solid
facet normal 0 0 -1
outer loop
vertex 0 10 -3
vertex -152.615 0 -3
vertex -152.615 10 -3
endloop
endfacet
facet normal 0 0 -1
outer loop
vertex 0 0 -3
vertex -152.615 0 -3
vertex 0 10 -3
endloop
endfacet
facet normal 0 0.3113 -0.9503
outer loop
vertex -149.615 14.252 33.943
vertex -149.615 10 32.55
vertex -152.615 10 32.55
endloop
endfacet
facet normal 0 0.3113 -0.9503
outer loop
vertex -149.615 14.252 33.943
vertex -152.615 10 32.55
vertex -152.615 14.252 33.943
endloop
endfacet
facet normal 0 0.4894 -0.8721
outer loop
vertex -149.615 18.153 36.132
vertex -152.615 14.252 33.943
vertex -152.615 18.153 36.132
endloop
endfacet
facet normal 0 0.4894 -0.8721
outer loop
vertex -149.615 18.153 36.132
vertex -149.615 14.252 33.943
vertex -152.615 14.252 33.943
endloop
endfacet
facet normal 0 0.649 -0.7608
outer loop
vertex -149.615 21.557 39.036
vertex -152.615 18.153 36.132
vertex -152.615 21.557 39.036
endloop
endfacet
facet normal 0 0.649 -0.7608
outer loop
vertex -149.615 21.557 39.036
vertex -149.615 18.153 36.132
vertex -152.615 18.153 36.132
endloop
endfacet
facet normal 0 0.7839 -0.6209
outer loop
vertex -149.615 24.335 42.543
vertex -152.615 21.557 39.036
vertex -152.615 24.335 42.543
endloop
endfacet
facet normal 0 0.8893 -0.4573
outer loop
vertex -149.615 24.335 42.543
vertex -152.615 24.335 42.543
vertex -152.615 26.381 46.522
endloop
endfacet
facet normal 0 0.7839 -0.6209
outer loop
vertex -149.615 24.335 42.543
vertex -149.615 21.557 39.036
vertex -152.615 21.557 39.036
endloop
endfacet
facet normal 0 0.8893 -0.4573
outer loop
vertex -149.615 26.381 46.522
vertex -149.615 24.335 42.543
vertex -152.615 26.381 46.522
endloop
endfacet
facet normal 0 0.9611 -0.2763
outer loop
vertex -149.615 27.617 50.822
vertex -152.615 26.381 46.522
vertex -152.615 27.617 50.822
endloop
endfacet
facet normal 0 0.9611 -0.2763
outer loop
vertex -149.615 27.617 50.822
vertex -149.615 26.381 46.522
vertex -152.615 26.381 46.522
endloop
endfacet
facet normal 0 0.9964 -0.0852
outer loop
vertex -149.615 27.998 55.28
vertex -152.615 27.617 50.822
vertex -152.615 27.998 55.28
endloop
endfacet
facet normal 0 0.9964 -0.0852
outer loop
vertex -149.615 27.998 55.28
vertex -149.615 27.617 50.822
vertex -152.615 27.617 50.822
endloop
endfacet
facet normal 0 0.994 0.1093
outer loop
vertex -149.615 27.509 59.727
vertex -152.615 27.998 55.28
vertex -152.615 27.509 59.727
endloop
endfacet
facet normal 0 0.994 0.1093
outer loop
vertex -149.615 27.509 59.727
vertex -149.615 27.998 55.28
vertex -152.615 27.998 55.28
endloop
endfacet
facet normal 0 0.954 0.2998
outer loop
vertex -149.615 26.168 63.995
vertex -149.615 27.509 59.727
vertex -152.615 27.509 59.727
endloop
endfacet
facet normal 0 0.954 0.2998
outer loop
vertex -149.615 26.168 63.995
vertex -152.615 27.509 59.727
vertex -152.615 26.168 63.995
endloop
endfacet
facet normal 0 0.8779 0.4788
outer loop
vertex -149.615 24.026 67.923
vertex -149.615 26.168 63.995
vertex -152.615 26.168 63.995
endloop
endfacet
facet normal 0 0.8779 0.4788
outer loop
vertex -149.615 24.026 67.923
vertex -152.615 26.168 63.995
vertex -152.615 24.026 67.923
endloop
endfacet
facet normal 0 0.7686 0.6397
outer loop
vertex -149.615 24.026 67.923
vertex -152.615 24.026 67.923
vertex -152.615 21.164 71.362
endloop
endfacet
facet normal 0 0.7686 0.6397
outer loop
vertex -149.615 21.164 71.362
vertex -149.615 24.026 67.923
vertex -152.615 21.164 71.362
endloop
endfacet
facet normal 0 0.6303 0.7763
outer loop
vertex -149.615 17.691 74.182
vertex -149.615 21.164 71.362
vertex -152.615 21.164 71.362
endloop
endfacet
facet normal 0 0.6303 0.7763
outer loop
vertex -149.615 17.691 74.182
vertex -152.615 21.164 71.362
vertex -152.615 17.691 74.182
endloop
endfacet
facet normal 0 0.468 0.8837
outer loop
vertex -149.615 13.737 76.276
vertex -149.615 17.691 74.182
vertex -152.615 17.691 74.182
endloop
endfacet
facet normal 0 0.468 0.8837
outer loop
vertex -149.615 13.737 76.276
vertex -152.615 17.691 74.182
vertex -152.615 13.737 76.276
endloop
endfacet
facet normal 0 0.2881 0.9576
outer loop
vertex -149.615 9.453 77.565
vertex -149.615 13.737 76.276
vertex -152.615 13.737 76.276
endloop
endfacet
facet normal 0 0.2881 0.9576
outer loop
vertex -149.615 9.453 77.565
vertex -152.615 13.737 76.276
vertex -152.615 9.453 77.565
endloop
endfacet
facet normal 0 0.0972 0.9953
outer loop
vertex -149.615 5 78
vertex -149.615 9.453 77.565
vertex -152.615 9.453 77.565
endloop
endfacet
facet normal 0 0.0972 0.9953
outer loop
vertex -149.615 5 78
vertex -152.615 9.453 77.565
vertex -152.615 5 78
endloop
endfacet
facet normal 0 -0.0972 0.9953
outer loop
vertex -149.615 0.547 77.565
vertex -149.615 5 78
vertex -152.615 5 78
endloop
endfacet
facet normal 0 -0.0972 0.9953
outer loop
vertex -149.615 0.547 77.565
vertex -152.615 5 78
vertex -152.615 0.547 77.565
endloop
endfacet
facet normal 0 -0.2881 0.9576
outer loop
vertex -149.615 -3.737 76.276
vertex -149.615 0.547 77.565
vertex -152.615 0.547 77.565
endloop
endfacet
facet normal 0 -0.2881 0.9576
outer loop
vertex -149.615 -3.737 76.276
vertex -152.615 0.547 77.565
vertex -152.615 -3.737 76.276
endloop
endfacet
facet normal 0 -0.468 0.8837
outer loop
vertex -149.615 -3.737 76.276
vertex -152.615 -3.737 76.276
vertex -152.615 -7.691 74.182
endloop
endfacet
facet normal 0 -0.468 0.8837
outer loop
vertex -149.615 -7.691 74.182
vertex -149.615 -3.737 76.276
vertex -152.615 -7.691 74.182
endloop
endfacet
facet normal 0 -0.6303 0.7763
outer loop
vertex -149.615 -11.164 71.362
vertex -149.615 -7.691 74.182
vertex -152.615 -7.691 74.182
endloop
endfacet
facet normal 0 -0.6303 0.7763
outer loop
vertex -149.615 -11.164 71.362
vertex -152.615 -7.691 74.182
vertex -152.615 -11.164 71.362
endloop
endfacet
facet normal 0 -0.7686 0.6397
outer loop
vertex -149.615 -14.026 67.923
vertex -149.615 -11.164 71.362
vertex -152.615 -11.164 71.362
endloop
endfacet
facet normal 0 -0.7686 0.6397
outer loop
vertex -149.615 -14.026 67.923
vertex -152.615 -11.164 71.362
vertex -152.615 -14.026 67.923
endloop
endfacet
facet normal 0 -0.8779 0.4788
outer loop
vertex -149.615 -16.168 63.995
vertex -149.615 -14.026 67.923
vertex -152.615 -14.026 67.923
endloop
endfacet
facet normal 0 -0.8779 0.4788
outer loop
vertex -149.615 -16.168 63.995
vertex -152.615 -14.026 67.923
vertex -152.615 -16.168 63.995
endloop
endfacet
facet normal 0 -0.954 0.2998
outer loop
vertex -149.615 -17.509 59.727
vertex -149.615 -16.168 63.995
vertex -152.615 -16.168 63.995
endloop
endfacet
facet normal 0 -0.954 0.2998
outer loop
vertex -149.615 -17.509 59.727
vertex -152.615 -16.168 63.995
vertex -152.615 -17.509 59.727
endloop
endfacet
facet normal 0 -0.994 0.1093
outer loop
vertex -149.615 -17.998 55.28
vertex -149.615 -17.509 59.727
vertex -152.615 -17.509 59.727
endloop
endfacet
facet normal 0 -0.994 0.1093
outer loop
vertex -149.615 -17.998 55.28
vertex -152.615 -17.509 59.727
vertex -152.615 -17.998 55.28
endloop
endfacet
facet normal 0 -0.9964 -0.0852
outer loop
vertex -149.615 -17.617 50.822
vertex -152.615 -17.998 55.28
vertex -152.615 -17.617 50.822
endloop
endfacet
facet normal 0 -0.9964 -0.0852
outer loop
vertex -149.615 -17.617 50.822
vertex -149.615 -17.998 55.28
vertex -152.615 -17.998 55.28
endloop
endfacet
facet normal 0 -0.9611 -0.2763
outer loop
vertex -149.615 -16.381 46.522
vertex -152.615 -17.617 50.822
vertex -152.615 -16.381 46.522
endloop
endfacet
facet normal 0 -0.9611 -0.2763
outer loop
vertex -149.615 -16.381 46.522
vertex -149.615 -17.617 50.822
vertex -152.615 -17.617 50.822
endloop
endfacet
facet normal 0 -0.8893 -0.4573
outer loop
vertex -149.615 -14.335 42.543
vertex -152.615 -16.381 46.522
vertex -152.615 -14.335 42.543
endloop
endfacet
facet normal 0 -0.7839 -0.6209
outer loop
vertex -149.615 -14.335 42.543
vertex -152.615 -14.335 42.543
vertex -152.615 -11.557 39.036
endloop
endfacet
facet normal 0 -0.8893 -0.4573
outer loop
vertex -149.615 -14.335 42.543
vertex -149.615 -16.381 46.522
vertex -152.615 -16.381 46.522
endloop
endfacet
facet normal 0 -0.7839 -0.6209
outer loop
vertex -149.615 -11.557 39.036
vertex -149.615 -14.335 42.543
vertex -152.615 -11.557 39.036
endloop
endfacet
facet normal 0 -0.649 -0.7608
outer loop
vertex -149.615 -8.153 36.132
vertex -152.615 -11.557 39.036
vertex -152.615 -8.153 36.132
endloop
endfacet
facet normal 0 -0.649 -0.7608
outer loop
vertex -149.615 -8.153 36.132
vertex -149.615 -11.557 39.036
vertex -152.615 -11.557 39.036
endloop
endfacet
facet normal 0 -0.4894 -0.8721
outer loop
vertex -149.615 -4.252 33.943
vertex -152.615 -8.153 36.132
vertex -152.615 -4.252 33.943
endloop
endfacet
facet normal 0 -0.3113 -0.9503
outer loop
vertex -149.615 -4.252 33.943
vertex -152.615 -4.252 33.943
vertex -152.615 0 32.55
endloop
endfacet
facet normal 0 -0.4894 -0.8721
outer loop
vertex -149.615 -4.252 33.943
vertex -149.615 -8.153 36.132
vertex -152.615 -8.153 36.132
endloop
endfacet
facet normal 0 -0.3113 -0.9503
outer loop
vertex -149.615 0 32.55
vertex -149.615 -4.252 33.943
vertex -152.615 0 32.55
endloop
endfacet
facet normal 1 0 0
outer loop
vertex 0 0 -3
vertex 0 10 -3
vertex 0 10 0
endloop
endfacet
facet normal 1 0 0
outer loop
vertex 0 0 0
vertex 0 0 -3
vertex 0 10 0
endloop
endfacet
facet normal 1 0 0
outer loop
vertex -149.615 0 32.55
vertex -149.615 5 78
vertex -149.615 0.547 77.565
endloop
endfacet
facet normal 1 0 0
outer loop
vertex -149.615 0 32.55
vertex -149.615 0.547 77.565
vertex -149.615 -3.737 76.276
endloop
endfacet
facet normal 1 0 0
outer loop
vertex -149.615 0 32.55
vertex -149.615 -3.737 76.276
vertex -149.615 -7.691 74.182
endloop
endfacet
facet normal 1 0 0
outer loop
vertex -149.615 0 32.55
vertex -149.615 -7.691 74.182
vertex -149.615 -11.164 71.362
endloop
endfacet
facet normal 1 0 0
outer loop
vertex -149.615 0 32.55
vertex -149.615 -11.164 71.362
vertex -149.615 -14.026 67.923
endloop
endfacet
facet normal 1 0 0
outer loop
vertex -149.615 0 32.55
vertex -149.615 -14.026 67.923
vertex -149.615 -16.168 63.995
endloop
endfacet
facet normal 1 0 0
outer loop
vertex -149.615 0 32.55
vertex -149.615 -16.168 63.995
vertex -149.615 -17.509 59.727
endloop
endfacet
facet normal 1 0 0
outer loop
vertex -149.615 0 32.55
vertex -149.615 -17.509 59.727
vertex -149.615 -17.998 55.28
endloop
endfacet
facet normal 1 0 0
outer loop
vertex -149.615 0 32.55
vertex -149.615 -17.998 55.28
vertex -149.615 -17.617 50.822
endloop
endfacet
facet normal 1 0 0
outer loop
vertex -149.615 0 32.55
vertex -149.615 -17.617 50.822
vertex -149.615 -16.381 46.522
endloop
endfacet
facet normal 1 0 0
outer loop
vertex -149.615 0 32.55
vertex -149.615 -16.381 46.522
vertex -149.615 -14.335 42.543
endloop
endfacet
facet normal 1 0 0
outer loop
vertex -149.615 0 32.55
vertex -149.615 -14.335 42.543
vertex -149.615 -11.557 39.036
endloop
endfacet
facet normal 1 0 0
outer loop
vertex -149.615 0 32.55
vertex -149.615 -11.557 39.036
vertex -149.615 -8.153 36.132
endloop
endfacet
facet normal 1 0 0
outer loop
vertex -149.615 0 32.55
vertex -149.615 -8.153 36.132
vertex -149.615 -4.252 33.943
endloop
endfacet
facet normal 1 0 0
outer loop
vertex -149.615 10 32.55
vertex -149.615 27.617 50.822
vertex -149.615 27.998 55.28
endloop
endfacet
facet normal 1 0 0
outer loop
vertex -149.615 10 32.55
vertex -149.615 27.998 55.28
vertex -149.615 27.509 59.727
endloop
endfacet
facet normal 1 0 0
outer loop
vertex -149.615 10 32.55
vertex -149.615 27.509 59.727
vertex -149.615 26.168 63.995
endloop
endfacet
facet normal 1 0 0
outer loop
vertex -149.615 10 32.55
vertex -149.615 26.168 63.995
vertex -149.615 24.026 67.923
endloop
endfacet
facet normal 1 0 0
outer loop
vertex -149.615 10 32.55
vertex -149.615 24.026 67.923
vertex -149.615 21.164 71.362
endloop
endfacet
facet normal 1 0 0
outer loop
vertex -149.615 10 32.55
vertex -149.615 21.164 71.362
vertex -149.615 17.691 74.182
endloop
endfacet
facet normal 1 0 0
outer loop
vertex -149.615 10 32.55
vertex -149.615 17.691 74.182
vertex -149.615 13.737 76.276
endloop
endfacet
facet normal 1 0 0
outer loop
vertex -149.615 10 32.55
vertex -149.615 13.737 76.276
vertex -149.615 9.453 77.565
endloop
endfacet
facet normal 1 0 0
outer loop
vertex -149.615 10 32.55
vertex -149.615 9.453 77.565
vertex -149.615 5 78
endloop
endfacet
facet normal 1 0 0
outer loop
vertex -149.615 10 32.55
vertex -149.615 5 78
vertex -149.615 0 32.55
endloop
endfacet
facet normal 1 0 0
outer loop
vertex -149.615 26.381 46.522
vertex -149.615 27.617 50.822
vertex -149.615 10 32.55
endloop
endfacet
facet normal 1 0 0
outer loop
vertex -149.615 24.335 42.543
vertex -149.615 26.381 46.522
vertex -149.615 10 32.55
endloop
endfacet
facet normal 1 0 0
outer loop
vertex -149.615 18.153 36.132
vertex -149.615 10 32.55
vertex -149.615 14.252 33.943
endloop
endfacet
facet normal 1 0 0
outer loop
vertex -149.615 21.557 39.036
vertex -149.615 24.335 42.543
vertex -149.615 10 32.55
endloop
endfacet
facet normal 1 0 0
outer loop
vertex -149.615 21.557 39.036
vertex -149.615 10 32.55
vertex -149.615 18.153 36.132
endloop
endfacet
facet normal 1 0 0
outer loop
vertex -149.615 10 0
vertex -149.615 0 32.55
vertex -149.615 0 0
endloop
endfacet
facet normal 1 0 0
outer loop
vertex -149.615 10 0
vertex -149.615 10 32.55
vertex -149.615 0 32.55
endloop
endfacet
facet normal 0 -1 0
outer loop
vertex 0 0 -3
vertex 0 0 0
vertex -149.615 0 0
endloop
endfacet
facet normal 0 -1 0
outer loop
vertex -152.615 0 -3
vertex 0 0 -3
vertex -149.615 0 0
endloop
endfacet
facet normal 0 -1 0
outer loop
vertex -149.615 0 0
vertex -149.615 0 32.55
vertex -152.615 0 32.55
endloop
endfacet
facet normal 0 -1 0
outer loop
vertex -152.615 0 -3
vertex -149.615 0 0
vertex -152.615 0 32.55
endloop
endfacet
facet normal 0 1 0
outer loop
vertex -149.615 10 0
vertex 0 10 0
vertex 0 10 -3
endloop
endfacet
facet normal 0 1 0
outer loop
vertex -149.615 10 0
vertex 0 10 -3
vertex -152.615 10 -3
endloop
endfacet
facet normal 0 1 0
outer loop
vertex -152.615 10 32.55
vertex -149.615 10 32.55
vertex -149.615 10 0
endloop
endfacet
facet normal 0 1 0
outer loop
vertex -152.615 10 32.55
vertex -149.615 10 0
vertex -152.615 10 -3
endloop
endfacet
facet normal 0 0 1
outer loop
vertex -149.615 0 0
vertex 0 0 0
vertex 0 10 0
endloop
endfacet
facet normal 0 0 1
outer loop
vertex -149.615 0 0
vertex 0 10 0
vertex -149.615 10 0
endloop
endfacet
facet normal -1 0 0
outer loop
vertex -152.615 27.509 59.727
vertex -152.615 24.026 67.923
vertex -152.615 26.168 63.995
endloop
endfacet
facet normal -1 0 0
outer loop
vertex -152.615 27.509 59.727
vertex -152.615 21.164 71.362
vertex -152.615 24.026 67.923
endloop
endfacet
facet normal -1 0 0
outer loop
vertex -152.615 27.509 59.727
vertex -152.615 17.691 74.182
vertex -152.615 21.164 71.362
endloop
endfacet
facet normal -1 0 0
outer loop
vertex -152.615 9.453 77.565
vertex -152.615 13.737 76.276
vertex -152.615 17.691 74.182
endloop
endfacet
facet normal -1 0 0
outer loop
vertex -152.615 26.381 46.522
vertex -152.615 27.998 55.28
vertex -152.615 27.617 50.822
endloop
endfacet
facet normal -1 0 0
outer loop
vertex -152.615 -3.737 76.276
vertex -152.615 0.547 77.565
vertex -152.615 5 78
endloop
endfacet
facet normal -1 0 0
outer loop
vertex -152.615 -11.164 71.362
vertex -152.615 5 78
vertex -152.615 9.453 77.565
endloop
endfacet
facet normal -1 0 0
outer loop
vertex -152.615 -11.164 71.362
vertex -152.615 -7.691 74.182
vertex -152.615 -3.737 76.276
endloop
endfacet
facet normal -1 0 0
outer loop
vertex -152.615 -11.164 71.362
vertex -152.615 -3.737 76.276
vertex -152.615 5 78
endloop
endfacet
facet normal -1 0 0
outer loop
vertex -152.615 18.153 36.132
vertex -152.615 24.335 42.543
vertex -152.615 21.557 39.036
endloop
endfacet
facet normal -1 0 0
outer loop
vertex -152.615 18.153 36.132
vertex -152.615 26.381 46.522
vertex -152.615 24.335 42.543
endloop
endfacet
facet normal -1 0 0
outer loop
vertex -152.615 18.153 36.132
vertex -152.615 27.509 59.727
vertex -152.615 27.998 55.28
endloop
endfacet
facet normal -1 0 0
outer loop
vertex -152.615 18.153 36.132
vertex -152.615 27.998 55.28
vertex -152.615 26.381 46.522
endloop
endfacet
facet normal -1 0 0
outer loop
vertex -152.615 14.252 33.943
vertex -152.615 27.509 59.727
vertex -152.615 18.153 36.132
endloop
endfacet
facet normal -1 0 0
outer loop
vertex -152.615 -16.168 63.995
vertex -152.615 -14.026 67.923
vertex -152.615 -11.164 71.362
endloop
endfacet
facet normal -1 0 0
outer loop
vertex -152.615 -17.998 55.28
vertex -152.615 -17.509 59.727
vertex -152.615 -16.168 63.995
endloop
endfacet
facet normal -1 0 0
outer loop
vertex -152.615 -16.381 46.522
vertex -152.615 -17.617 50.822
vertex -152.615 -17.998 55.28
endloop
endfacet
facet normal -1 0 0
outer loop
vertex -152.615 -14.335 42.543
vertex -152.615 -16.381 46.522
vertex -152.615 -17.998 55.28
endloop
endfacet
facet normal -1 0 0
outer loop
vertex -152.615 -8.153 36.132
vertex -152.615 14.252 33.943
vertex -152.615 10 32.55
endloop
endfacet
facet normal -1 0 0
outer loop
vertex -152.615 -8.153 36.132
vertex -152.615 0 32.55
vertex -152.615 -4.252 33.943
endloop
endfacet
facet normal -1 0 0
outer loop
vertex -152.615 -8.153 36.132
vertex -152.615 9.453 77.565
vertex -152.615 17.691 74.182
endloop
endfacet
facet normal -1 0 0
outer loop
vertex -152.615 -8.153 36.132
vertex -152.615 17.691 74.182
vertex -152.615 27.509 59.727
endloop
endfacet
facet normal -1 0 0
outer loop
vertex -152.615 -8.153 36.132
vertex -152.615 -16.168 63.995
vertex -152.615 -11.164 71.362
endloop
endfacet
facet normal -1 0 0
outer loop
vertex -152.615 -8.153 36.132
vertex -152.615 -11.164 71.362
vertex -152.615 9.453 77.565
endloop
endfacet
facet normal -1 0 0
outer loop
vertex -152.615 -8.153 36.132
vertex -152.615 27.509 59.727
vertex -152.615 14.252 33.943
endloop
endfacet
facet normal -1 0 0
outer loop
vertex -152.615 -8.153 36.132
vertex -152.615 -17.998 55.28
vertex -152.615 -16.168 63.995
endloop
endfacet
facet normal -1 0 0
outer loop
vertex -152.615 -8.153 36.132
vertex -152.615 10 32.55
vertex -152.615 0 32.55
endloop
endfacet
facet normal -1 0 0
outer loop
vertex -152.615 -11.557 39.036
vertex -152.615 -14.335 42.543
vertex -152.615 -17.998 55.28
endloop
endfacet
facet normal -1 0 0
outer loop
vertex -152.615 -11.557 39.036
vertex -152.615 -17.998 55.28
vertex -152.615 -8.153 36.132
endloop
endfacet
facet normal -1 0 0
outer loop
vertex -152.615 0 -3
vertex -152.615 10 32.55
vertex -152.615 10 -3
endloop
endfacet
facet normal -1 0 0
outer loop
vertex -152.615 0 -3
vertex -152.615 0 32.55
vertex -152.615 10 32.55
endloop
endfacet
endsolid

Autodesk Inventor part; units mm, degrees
ref_plane "YZ Plane" through (0, 0, 0) normal (1, 0, 0) x (0, 1, 0)
ref_plane "XZ Plane" through (0, 0, 0) normal (0, 1, 0) x (-1, 0, 0)
ref_plane "XY Plane" through (0, 0, 0) normal (0, 0, 1) x (1, 0, 0)
sketch "Эскиз5" plane through (0, 0, 0) normal (0, 1, 0) x (-1, 0, 0)
  line L0 (152.615, 60) -> (152.615, -3)
  line L1 (152.615, -3) -> (0, -3)
  line L2 (0, -3) -> (0, 0)
  line L3 (0, 0) -> (149.615, 0)
  line L4 (149.615, 0) -> (149.615, 60)
  line L5 (149.615, 60) -> (152.615, 60)
  dimension "d40" = 149.615
  dimension "d41" = 3
  dimension "d42" = 60
extrude "Выдавливание2" add sketch "Эскиз5" along normal blind 10
sketch "Эскиз6" plane through (-149.615, 0, 60) normal (1, 0, 0) x (0, 0, -1)
  line L0 (63, 0) -> (0, 0) projected
  line L1 (0, 10) -> (10, 10) construction
  line L2 (10, 10) -> (10, 0) construction
  line L3 (10, 0) -> (0, 0) construction
  line L4 (0, 0) -> (0, 10) construction
  line L5 (0, 10) -> (10, 0) construction
  line L6 (10, 10) -> (0, 0) construction
  circle A0 centre (5, 5) radius 23
  point P0 (60, 0)
  dimension "d45" = 46
extrude "Выдавливание3" add sketch "Эскиз6" against normal blind 3
properties part number "Mirror_ыефтв" material "Сталь, мягкая"
